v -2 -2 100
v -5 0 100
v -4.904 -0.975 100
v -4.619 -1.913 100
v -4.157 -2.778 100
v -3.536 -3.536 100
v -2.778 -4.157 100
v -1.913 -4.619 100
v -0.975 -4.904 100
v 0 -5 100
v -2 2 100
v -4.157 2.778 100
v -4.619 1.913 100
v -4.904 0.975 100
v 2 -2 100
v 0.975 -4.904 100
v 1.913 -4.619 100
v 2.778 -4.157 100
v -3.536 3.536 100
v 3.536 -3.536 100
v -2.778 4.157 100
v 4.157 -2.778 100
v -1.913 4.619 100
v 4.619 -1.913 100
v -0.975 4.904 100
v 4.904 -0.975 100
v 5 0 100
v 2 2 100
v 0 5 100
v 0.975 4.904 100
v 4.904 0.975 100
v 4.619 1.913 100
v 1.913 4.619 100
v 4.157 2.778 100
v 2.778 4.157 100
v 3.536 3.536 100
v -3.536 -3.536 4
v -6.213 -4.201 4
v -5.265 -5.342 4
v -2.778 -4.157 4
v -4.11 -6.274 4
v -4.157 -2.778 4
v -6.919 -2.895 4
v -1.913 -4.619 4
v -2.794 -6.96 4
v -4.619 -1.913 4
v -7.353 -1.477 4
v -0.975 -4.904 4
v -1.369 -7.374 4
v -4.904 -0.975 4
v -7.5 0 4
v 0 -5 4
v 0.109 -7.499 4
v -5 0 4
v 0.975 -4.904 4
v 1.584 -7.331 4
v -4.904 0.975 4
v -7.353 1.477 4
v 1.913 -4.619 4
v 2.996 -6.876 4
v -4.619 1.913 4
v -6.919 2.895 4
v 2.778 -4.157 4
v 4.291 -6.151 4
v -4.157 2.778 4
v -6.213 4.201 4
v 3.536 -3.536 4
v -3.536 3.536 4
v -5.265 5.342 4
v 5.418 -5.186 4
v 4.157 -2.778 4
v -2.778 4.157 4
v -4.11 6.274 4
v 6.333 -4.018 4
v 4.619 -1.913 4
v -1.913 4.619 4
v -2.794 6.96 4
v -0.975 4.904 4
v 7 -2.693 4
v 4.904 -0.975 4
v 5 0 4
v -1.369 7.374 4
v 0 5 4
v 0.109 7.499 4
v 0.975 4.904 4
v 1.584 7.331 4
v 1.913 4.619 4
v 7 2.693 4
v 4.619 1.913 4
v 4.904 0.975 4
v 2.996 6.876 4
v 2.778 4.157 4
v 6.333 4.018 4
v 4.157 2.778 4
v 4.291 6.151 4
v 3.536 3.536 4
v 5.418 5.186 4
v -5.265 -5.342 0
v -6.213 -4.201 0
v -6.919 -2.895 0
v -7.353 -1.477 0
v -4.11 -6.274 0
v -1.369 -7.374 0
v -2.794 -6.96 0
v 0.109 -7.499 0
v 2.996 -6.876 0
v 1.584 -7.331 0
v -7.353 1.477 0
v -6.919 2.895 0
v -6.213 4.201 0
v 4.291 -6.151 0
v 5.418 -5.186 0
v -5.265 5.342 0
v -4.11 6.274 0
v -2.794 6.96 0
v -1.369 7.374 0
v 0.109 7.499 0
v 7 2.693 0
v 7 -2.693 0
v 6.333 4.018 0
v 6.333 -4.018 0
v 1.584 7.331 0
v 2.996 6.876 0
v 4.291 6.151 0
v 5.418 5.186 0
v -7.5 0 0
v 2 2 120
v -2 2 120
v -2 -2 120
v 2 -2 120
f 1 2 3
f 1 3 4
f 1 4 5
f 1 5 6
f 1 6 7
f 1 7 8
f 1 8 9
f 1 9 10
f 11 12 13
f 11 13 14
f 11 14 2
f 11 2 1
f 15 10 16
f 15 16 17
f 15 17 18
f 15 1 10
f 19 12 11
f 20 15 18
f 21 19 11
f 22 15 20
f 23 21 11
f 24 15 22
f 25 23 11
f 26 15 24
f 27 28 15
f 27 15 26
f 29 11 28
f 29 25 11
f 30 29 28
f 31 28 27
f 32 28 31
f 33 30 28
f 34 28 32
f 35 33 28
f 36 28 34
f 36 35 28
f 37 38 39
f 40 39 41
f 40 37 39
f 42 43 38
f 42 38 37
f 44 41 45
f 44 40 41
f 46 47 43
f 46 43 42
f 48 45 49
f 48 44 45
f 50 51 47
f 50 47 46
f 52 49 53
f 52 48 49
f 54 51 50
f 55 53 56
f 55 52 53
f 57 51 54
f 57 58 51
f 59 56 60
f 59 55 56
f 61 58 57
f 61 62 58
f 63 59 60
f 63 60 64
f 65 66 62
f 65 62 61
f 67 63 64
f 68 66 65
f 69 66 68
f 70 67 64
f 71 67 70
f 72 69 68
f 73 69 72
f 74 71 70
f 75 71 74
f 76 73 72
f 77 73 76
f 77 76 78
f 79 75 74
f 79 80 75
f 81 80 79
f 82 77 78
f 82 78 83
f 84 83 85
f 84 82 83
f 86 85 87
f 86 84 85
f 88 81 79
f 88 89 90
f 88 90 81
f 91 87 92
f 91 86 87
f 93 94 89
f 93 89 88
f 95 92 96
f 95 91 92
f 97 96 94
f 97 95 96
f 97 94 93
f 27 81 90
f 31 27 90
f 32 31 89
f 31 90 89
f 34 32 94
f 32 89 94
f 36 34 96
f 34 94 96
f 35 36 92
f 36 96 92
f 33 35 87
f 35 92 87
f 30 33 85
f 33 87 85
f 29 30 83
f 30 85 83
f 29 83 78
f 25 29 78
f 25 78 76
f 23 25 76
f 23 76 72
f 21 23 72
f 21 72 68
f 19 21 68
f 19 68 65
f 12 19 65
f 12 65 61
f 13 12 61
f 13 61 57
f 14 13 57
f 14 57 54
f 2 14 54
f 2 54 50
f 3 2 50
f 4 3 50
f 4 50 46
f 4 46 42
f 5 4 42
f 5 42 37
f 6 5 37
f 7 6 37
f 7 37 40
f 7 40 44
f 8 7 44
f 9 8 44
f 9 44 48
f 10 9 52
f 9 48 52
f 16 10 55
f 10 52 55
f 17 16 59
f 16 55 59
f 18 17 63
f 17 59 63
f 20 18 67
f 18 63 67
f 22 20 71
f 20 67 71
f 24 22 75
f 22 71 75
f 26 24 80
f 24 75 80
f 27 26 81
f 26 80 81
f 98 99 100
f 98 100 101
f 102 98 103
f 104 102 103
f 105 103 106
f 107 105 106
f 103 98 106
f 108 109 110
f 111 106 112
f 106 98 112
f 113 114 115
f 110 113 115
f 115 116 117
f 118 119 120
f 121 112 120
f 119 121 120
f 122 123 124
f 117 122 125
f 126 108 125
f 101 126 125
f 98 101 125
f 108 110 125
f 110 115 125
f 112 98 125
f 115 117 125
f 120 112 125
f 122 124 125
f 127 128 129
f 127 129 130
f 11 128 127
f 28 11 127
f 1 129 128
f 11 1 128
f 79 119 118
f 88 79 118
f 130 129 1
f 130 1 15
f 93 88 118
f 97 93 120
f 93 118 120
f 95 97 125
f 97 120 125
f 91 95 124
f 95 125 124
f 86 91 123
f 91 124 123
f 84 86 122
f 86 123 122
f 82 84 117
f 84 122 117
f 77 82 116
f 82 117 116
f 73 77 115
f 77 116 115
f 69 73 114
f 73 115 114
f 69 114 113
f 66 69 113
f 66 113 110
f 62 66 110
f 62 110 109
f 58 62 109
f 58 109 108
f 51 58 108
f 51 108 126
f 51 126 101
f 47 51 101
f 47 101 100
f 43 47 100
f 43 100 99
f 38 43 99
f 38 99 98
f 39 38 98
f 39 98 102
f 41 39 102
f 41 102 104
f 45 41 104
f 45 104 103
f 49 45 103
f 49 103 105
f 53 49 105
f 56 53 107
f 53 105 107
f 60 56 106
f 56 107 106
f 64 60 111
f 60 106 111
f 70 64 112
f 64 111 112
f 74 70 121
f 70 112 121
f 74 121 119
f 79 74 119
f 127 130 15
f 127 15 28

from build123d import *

# Parameters (mm, degrees)
F0_R     = 7.5
F1_DEPTH = 4
F2_R     = 5
F3_DEPTH = 100
F4_W     = 4
F4_H     = 4
F5_DEPTH = 20
F6_W     = 10.298821
F6_H     = 32.871584
F7_DEPTH = 25


with BuildPart() as f1:
    # F0 (on Top) → F1 (new body)
    with BuildSketch(Plane.XY):
        Circle(F0_R)
    extrude(amount=F1_DEPTH)

    # F2 (on Top) → F3 (join)
    with BuildSketch(Plane.XY):
        Circle(F2_R)
    extrude(amount=F3_DEPTH)

    # F4 (on face) → F5 (join)
    with BuildSketch(Plane.XY.offset(100)):
        Rectangle(F4_W, F4_H)
    extrude(amount=F5_DEPTH)

    # F6 (on Top) → F7 (cut)
    with BuildSketch(Plane.XY):
        with Locations((12.149411, 0.144365)):
            Rectangle(F6_W, F6_H)
    extrude(amount=F7_DEPTH, mode=Mode.SUBTRACT)


solid = f1.part
